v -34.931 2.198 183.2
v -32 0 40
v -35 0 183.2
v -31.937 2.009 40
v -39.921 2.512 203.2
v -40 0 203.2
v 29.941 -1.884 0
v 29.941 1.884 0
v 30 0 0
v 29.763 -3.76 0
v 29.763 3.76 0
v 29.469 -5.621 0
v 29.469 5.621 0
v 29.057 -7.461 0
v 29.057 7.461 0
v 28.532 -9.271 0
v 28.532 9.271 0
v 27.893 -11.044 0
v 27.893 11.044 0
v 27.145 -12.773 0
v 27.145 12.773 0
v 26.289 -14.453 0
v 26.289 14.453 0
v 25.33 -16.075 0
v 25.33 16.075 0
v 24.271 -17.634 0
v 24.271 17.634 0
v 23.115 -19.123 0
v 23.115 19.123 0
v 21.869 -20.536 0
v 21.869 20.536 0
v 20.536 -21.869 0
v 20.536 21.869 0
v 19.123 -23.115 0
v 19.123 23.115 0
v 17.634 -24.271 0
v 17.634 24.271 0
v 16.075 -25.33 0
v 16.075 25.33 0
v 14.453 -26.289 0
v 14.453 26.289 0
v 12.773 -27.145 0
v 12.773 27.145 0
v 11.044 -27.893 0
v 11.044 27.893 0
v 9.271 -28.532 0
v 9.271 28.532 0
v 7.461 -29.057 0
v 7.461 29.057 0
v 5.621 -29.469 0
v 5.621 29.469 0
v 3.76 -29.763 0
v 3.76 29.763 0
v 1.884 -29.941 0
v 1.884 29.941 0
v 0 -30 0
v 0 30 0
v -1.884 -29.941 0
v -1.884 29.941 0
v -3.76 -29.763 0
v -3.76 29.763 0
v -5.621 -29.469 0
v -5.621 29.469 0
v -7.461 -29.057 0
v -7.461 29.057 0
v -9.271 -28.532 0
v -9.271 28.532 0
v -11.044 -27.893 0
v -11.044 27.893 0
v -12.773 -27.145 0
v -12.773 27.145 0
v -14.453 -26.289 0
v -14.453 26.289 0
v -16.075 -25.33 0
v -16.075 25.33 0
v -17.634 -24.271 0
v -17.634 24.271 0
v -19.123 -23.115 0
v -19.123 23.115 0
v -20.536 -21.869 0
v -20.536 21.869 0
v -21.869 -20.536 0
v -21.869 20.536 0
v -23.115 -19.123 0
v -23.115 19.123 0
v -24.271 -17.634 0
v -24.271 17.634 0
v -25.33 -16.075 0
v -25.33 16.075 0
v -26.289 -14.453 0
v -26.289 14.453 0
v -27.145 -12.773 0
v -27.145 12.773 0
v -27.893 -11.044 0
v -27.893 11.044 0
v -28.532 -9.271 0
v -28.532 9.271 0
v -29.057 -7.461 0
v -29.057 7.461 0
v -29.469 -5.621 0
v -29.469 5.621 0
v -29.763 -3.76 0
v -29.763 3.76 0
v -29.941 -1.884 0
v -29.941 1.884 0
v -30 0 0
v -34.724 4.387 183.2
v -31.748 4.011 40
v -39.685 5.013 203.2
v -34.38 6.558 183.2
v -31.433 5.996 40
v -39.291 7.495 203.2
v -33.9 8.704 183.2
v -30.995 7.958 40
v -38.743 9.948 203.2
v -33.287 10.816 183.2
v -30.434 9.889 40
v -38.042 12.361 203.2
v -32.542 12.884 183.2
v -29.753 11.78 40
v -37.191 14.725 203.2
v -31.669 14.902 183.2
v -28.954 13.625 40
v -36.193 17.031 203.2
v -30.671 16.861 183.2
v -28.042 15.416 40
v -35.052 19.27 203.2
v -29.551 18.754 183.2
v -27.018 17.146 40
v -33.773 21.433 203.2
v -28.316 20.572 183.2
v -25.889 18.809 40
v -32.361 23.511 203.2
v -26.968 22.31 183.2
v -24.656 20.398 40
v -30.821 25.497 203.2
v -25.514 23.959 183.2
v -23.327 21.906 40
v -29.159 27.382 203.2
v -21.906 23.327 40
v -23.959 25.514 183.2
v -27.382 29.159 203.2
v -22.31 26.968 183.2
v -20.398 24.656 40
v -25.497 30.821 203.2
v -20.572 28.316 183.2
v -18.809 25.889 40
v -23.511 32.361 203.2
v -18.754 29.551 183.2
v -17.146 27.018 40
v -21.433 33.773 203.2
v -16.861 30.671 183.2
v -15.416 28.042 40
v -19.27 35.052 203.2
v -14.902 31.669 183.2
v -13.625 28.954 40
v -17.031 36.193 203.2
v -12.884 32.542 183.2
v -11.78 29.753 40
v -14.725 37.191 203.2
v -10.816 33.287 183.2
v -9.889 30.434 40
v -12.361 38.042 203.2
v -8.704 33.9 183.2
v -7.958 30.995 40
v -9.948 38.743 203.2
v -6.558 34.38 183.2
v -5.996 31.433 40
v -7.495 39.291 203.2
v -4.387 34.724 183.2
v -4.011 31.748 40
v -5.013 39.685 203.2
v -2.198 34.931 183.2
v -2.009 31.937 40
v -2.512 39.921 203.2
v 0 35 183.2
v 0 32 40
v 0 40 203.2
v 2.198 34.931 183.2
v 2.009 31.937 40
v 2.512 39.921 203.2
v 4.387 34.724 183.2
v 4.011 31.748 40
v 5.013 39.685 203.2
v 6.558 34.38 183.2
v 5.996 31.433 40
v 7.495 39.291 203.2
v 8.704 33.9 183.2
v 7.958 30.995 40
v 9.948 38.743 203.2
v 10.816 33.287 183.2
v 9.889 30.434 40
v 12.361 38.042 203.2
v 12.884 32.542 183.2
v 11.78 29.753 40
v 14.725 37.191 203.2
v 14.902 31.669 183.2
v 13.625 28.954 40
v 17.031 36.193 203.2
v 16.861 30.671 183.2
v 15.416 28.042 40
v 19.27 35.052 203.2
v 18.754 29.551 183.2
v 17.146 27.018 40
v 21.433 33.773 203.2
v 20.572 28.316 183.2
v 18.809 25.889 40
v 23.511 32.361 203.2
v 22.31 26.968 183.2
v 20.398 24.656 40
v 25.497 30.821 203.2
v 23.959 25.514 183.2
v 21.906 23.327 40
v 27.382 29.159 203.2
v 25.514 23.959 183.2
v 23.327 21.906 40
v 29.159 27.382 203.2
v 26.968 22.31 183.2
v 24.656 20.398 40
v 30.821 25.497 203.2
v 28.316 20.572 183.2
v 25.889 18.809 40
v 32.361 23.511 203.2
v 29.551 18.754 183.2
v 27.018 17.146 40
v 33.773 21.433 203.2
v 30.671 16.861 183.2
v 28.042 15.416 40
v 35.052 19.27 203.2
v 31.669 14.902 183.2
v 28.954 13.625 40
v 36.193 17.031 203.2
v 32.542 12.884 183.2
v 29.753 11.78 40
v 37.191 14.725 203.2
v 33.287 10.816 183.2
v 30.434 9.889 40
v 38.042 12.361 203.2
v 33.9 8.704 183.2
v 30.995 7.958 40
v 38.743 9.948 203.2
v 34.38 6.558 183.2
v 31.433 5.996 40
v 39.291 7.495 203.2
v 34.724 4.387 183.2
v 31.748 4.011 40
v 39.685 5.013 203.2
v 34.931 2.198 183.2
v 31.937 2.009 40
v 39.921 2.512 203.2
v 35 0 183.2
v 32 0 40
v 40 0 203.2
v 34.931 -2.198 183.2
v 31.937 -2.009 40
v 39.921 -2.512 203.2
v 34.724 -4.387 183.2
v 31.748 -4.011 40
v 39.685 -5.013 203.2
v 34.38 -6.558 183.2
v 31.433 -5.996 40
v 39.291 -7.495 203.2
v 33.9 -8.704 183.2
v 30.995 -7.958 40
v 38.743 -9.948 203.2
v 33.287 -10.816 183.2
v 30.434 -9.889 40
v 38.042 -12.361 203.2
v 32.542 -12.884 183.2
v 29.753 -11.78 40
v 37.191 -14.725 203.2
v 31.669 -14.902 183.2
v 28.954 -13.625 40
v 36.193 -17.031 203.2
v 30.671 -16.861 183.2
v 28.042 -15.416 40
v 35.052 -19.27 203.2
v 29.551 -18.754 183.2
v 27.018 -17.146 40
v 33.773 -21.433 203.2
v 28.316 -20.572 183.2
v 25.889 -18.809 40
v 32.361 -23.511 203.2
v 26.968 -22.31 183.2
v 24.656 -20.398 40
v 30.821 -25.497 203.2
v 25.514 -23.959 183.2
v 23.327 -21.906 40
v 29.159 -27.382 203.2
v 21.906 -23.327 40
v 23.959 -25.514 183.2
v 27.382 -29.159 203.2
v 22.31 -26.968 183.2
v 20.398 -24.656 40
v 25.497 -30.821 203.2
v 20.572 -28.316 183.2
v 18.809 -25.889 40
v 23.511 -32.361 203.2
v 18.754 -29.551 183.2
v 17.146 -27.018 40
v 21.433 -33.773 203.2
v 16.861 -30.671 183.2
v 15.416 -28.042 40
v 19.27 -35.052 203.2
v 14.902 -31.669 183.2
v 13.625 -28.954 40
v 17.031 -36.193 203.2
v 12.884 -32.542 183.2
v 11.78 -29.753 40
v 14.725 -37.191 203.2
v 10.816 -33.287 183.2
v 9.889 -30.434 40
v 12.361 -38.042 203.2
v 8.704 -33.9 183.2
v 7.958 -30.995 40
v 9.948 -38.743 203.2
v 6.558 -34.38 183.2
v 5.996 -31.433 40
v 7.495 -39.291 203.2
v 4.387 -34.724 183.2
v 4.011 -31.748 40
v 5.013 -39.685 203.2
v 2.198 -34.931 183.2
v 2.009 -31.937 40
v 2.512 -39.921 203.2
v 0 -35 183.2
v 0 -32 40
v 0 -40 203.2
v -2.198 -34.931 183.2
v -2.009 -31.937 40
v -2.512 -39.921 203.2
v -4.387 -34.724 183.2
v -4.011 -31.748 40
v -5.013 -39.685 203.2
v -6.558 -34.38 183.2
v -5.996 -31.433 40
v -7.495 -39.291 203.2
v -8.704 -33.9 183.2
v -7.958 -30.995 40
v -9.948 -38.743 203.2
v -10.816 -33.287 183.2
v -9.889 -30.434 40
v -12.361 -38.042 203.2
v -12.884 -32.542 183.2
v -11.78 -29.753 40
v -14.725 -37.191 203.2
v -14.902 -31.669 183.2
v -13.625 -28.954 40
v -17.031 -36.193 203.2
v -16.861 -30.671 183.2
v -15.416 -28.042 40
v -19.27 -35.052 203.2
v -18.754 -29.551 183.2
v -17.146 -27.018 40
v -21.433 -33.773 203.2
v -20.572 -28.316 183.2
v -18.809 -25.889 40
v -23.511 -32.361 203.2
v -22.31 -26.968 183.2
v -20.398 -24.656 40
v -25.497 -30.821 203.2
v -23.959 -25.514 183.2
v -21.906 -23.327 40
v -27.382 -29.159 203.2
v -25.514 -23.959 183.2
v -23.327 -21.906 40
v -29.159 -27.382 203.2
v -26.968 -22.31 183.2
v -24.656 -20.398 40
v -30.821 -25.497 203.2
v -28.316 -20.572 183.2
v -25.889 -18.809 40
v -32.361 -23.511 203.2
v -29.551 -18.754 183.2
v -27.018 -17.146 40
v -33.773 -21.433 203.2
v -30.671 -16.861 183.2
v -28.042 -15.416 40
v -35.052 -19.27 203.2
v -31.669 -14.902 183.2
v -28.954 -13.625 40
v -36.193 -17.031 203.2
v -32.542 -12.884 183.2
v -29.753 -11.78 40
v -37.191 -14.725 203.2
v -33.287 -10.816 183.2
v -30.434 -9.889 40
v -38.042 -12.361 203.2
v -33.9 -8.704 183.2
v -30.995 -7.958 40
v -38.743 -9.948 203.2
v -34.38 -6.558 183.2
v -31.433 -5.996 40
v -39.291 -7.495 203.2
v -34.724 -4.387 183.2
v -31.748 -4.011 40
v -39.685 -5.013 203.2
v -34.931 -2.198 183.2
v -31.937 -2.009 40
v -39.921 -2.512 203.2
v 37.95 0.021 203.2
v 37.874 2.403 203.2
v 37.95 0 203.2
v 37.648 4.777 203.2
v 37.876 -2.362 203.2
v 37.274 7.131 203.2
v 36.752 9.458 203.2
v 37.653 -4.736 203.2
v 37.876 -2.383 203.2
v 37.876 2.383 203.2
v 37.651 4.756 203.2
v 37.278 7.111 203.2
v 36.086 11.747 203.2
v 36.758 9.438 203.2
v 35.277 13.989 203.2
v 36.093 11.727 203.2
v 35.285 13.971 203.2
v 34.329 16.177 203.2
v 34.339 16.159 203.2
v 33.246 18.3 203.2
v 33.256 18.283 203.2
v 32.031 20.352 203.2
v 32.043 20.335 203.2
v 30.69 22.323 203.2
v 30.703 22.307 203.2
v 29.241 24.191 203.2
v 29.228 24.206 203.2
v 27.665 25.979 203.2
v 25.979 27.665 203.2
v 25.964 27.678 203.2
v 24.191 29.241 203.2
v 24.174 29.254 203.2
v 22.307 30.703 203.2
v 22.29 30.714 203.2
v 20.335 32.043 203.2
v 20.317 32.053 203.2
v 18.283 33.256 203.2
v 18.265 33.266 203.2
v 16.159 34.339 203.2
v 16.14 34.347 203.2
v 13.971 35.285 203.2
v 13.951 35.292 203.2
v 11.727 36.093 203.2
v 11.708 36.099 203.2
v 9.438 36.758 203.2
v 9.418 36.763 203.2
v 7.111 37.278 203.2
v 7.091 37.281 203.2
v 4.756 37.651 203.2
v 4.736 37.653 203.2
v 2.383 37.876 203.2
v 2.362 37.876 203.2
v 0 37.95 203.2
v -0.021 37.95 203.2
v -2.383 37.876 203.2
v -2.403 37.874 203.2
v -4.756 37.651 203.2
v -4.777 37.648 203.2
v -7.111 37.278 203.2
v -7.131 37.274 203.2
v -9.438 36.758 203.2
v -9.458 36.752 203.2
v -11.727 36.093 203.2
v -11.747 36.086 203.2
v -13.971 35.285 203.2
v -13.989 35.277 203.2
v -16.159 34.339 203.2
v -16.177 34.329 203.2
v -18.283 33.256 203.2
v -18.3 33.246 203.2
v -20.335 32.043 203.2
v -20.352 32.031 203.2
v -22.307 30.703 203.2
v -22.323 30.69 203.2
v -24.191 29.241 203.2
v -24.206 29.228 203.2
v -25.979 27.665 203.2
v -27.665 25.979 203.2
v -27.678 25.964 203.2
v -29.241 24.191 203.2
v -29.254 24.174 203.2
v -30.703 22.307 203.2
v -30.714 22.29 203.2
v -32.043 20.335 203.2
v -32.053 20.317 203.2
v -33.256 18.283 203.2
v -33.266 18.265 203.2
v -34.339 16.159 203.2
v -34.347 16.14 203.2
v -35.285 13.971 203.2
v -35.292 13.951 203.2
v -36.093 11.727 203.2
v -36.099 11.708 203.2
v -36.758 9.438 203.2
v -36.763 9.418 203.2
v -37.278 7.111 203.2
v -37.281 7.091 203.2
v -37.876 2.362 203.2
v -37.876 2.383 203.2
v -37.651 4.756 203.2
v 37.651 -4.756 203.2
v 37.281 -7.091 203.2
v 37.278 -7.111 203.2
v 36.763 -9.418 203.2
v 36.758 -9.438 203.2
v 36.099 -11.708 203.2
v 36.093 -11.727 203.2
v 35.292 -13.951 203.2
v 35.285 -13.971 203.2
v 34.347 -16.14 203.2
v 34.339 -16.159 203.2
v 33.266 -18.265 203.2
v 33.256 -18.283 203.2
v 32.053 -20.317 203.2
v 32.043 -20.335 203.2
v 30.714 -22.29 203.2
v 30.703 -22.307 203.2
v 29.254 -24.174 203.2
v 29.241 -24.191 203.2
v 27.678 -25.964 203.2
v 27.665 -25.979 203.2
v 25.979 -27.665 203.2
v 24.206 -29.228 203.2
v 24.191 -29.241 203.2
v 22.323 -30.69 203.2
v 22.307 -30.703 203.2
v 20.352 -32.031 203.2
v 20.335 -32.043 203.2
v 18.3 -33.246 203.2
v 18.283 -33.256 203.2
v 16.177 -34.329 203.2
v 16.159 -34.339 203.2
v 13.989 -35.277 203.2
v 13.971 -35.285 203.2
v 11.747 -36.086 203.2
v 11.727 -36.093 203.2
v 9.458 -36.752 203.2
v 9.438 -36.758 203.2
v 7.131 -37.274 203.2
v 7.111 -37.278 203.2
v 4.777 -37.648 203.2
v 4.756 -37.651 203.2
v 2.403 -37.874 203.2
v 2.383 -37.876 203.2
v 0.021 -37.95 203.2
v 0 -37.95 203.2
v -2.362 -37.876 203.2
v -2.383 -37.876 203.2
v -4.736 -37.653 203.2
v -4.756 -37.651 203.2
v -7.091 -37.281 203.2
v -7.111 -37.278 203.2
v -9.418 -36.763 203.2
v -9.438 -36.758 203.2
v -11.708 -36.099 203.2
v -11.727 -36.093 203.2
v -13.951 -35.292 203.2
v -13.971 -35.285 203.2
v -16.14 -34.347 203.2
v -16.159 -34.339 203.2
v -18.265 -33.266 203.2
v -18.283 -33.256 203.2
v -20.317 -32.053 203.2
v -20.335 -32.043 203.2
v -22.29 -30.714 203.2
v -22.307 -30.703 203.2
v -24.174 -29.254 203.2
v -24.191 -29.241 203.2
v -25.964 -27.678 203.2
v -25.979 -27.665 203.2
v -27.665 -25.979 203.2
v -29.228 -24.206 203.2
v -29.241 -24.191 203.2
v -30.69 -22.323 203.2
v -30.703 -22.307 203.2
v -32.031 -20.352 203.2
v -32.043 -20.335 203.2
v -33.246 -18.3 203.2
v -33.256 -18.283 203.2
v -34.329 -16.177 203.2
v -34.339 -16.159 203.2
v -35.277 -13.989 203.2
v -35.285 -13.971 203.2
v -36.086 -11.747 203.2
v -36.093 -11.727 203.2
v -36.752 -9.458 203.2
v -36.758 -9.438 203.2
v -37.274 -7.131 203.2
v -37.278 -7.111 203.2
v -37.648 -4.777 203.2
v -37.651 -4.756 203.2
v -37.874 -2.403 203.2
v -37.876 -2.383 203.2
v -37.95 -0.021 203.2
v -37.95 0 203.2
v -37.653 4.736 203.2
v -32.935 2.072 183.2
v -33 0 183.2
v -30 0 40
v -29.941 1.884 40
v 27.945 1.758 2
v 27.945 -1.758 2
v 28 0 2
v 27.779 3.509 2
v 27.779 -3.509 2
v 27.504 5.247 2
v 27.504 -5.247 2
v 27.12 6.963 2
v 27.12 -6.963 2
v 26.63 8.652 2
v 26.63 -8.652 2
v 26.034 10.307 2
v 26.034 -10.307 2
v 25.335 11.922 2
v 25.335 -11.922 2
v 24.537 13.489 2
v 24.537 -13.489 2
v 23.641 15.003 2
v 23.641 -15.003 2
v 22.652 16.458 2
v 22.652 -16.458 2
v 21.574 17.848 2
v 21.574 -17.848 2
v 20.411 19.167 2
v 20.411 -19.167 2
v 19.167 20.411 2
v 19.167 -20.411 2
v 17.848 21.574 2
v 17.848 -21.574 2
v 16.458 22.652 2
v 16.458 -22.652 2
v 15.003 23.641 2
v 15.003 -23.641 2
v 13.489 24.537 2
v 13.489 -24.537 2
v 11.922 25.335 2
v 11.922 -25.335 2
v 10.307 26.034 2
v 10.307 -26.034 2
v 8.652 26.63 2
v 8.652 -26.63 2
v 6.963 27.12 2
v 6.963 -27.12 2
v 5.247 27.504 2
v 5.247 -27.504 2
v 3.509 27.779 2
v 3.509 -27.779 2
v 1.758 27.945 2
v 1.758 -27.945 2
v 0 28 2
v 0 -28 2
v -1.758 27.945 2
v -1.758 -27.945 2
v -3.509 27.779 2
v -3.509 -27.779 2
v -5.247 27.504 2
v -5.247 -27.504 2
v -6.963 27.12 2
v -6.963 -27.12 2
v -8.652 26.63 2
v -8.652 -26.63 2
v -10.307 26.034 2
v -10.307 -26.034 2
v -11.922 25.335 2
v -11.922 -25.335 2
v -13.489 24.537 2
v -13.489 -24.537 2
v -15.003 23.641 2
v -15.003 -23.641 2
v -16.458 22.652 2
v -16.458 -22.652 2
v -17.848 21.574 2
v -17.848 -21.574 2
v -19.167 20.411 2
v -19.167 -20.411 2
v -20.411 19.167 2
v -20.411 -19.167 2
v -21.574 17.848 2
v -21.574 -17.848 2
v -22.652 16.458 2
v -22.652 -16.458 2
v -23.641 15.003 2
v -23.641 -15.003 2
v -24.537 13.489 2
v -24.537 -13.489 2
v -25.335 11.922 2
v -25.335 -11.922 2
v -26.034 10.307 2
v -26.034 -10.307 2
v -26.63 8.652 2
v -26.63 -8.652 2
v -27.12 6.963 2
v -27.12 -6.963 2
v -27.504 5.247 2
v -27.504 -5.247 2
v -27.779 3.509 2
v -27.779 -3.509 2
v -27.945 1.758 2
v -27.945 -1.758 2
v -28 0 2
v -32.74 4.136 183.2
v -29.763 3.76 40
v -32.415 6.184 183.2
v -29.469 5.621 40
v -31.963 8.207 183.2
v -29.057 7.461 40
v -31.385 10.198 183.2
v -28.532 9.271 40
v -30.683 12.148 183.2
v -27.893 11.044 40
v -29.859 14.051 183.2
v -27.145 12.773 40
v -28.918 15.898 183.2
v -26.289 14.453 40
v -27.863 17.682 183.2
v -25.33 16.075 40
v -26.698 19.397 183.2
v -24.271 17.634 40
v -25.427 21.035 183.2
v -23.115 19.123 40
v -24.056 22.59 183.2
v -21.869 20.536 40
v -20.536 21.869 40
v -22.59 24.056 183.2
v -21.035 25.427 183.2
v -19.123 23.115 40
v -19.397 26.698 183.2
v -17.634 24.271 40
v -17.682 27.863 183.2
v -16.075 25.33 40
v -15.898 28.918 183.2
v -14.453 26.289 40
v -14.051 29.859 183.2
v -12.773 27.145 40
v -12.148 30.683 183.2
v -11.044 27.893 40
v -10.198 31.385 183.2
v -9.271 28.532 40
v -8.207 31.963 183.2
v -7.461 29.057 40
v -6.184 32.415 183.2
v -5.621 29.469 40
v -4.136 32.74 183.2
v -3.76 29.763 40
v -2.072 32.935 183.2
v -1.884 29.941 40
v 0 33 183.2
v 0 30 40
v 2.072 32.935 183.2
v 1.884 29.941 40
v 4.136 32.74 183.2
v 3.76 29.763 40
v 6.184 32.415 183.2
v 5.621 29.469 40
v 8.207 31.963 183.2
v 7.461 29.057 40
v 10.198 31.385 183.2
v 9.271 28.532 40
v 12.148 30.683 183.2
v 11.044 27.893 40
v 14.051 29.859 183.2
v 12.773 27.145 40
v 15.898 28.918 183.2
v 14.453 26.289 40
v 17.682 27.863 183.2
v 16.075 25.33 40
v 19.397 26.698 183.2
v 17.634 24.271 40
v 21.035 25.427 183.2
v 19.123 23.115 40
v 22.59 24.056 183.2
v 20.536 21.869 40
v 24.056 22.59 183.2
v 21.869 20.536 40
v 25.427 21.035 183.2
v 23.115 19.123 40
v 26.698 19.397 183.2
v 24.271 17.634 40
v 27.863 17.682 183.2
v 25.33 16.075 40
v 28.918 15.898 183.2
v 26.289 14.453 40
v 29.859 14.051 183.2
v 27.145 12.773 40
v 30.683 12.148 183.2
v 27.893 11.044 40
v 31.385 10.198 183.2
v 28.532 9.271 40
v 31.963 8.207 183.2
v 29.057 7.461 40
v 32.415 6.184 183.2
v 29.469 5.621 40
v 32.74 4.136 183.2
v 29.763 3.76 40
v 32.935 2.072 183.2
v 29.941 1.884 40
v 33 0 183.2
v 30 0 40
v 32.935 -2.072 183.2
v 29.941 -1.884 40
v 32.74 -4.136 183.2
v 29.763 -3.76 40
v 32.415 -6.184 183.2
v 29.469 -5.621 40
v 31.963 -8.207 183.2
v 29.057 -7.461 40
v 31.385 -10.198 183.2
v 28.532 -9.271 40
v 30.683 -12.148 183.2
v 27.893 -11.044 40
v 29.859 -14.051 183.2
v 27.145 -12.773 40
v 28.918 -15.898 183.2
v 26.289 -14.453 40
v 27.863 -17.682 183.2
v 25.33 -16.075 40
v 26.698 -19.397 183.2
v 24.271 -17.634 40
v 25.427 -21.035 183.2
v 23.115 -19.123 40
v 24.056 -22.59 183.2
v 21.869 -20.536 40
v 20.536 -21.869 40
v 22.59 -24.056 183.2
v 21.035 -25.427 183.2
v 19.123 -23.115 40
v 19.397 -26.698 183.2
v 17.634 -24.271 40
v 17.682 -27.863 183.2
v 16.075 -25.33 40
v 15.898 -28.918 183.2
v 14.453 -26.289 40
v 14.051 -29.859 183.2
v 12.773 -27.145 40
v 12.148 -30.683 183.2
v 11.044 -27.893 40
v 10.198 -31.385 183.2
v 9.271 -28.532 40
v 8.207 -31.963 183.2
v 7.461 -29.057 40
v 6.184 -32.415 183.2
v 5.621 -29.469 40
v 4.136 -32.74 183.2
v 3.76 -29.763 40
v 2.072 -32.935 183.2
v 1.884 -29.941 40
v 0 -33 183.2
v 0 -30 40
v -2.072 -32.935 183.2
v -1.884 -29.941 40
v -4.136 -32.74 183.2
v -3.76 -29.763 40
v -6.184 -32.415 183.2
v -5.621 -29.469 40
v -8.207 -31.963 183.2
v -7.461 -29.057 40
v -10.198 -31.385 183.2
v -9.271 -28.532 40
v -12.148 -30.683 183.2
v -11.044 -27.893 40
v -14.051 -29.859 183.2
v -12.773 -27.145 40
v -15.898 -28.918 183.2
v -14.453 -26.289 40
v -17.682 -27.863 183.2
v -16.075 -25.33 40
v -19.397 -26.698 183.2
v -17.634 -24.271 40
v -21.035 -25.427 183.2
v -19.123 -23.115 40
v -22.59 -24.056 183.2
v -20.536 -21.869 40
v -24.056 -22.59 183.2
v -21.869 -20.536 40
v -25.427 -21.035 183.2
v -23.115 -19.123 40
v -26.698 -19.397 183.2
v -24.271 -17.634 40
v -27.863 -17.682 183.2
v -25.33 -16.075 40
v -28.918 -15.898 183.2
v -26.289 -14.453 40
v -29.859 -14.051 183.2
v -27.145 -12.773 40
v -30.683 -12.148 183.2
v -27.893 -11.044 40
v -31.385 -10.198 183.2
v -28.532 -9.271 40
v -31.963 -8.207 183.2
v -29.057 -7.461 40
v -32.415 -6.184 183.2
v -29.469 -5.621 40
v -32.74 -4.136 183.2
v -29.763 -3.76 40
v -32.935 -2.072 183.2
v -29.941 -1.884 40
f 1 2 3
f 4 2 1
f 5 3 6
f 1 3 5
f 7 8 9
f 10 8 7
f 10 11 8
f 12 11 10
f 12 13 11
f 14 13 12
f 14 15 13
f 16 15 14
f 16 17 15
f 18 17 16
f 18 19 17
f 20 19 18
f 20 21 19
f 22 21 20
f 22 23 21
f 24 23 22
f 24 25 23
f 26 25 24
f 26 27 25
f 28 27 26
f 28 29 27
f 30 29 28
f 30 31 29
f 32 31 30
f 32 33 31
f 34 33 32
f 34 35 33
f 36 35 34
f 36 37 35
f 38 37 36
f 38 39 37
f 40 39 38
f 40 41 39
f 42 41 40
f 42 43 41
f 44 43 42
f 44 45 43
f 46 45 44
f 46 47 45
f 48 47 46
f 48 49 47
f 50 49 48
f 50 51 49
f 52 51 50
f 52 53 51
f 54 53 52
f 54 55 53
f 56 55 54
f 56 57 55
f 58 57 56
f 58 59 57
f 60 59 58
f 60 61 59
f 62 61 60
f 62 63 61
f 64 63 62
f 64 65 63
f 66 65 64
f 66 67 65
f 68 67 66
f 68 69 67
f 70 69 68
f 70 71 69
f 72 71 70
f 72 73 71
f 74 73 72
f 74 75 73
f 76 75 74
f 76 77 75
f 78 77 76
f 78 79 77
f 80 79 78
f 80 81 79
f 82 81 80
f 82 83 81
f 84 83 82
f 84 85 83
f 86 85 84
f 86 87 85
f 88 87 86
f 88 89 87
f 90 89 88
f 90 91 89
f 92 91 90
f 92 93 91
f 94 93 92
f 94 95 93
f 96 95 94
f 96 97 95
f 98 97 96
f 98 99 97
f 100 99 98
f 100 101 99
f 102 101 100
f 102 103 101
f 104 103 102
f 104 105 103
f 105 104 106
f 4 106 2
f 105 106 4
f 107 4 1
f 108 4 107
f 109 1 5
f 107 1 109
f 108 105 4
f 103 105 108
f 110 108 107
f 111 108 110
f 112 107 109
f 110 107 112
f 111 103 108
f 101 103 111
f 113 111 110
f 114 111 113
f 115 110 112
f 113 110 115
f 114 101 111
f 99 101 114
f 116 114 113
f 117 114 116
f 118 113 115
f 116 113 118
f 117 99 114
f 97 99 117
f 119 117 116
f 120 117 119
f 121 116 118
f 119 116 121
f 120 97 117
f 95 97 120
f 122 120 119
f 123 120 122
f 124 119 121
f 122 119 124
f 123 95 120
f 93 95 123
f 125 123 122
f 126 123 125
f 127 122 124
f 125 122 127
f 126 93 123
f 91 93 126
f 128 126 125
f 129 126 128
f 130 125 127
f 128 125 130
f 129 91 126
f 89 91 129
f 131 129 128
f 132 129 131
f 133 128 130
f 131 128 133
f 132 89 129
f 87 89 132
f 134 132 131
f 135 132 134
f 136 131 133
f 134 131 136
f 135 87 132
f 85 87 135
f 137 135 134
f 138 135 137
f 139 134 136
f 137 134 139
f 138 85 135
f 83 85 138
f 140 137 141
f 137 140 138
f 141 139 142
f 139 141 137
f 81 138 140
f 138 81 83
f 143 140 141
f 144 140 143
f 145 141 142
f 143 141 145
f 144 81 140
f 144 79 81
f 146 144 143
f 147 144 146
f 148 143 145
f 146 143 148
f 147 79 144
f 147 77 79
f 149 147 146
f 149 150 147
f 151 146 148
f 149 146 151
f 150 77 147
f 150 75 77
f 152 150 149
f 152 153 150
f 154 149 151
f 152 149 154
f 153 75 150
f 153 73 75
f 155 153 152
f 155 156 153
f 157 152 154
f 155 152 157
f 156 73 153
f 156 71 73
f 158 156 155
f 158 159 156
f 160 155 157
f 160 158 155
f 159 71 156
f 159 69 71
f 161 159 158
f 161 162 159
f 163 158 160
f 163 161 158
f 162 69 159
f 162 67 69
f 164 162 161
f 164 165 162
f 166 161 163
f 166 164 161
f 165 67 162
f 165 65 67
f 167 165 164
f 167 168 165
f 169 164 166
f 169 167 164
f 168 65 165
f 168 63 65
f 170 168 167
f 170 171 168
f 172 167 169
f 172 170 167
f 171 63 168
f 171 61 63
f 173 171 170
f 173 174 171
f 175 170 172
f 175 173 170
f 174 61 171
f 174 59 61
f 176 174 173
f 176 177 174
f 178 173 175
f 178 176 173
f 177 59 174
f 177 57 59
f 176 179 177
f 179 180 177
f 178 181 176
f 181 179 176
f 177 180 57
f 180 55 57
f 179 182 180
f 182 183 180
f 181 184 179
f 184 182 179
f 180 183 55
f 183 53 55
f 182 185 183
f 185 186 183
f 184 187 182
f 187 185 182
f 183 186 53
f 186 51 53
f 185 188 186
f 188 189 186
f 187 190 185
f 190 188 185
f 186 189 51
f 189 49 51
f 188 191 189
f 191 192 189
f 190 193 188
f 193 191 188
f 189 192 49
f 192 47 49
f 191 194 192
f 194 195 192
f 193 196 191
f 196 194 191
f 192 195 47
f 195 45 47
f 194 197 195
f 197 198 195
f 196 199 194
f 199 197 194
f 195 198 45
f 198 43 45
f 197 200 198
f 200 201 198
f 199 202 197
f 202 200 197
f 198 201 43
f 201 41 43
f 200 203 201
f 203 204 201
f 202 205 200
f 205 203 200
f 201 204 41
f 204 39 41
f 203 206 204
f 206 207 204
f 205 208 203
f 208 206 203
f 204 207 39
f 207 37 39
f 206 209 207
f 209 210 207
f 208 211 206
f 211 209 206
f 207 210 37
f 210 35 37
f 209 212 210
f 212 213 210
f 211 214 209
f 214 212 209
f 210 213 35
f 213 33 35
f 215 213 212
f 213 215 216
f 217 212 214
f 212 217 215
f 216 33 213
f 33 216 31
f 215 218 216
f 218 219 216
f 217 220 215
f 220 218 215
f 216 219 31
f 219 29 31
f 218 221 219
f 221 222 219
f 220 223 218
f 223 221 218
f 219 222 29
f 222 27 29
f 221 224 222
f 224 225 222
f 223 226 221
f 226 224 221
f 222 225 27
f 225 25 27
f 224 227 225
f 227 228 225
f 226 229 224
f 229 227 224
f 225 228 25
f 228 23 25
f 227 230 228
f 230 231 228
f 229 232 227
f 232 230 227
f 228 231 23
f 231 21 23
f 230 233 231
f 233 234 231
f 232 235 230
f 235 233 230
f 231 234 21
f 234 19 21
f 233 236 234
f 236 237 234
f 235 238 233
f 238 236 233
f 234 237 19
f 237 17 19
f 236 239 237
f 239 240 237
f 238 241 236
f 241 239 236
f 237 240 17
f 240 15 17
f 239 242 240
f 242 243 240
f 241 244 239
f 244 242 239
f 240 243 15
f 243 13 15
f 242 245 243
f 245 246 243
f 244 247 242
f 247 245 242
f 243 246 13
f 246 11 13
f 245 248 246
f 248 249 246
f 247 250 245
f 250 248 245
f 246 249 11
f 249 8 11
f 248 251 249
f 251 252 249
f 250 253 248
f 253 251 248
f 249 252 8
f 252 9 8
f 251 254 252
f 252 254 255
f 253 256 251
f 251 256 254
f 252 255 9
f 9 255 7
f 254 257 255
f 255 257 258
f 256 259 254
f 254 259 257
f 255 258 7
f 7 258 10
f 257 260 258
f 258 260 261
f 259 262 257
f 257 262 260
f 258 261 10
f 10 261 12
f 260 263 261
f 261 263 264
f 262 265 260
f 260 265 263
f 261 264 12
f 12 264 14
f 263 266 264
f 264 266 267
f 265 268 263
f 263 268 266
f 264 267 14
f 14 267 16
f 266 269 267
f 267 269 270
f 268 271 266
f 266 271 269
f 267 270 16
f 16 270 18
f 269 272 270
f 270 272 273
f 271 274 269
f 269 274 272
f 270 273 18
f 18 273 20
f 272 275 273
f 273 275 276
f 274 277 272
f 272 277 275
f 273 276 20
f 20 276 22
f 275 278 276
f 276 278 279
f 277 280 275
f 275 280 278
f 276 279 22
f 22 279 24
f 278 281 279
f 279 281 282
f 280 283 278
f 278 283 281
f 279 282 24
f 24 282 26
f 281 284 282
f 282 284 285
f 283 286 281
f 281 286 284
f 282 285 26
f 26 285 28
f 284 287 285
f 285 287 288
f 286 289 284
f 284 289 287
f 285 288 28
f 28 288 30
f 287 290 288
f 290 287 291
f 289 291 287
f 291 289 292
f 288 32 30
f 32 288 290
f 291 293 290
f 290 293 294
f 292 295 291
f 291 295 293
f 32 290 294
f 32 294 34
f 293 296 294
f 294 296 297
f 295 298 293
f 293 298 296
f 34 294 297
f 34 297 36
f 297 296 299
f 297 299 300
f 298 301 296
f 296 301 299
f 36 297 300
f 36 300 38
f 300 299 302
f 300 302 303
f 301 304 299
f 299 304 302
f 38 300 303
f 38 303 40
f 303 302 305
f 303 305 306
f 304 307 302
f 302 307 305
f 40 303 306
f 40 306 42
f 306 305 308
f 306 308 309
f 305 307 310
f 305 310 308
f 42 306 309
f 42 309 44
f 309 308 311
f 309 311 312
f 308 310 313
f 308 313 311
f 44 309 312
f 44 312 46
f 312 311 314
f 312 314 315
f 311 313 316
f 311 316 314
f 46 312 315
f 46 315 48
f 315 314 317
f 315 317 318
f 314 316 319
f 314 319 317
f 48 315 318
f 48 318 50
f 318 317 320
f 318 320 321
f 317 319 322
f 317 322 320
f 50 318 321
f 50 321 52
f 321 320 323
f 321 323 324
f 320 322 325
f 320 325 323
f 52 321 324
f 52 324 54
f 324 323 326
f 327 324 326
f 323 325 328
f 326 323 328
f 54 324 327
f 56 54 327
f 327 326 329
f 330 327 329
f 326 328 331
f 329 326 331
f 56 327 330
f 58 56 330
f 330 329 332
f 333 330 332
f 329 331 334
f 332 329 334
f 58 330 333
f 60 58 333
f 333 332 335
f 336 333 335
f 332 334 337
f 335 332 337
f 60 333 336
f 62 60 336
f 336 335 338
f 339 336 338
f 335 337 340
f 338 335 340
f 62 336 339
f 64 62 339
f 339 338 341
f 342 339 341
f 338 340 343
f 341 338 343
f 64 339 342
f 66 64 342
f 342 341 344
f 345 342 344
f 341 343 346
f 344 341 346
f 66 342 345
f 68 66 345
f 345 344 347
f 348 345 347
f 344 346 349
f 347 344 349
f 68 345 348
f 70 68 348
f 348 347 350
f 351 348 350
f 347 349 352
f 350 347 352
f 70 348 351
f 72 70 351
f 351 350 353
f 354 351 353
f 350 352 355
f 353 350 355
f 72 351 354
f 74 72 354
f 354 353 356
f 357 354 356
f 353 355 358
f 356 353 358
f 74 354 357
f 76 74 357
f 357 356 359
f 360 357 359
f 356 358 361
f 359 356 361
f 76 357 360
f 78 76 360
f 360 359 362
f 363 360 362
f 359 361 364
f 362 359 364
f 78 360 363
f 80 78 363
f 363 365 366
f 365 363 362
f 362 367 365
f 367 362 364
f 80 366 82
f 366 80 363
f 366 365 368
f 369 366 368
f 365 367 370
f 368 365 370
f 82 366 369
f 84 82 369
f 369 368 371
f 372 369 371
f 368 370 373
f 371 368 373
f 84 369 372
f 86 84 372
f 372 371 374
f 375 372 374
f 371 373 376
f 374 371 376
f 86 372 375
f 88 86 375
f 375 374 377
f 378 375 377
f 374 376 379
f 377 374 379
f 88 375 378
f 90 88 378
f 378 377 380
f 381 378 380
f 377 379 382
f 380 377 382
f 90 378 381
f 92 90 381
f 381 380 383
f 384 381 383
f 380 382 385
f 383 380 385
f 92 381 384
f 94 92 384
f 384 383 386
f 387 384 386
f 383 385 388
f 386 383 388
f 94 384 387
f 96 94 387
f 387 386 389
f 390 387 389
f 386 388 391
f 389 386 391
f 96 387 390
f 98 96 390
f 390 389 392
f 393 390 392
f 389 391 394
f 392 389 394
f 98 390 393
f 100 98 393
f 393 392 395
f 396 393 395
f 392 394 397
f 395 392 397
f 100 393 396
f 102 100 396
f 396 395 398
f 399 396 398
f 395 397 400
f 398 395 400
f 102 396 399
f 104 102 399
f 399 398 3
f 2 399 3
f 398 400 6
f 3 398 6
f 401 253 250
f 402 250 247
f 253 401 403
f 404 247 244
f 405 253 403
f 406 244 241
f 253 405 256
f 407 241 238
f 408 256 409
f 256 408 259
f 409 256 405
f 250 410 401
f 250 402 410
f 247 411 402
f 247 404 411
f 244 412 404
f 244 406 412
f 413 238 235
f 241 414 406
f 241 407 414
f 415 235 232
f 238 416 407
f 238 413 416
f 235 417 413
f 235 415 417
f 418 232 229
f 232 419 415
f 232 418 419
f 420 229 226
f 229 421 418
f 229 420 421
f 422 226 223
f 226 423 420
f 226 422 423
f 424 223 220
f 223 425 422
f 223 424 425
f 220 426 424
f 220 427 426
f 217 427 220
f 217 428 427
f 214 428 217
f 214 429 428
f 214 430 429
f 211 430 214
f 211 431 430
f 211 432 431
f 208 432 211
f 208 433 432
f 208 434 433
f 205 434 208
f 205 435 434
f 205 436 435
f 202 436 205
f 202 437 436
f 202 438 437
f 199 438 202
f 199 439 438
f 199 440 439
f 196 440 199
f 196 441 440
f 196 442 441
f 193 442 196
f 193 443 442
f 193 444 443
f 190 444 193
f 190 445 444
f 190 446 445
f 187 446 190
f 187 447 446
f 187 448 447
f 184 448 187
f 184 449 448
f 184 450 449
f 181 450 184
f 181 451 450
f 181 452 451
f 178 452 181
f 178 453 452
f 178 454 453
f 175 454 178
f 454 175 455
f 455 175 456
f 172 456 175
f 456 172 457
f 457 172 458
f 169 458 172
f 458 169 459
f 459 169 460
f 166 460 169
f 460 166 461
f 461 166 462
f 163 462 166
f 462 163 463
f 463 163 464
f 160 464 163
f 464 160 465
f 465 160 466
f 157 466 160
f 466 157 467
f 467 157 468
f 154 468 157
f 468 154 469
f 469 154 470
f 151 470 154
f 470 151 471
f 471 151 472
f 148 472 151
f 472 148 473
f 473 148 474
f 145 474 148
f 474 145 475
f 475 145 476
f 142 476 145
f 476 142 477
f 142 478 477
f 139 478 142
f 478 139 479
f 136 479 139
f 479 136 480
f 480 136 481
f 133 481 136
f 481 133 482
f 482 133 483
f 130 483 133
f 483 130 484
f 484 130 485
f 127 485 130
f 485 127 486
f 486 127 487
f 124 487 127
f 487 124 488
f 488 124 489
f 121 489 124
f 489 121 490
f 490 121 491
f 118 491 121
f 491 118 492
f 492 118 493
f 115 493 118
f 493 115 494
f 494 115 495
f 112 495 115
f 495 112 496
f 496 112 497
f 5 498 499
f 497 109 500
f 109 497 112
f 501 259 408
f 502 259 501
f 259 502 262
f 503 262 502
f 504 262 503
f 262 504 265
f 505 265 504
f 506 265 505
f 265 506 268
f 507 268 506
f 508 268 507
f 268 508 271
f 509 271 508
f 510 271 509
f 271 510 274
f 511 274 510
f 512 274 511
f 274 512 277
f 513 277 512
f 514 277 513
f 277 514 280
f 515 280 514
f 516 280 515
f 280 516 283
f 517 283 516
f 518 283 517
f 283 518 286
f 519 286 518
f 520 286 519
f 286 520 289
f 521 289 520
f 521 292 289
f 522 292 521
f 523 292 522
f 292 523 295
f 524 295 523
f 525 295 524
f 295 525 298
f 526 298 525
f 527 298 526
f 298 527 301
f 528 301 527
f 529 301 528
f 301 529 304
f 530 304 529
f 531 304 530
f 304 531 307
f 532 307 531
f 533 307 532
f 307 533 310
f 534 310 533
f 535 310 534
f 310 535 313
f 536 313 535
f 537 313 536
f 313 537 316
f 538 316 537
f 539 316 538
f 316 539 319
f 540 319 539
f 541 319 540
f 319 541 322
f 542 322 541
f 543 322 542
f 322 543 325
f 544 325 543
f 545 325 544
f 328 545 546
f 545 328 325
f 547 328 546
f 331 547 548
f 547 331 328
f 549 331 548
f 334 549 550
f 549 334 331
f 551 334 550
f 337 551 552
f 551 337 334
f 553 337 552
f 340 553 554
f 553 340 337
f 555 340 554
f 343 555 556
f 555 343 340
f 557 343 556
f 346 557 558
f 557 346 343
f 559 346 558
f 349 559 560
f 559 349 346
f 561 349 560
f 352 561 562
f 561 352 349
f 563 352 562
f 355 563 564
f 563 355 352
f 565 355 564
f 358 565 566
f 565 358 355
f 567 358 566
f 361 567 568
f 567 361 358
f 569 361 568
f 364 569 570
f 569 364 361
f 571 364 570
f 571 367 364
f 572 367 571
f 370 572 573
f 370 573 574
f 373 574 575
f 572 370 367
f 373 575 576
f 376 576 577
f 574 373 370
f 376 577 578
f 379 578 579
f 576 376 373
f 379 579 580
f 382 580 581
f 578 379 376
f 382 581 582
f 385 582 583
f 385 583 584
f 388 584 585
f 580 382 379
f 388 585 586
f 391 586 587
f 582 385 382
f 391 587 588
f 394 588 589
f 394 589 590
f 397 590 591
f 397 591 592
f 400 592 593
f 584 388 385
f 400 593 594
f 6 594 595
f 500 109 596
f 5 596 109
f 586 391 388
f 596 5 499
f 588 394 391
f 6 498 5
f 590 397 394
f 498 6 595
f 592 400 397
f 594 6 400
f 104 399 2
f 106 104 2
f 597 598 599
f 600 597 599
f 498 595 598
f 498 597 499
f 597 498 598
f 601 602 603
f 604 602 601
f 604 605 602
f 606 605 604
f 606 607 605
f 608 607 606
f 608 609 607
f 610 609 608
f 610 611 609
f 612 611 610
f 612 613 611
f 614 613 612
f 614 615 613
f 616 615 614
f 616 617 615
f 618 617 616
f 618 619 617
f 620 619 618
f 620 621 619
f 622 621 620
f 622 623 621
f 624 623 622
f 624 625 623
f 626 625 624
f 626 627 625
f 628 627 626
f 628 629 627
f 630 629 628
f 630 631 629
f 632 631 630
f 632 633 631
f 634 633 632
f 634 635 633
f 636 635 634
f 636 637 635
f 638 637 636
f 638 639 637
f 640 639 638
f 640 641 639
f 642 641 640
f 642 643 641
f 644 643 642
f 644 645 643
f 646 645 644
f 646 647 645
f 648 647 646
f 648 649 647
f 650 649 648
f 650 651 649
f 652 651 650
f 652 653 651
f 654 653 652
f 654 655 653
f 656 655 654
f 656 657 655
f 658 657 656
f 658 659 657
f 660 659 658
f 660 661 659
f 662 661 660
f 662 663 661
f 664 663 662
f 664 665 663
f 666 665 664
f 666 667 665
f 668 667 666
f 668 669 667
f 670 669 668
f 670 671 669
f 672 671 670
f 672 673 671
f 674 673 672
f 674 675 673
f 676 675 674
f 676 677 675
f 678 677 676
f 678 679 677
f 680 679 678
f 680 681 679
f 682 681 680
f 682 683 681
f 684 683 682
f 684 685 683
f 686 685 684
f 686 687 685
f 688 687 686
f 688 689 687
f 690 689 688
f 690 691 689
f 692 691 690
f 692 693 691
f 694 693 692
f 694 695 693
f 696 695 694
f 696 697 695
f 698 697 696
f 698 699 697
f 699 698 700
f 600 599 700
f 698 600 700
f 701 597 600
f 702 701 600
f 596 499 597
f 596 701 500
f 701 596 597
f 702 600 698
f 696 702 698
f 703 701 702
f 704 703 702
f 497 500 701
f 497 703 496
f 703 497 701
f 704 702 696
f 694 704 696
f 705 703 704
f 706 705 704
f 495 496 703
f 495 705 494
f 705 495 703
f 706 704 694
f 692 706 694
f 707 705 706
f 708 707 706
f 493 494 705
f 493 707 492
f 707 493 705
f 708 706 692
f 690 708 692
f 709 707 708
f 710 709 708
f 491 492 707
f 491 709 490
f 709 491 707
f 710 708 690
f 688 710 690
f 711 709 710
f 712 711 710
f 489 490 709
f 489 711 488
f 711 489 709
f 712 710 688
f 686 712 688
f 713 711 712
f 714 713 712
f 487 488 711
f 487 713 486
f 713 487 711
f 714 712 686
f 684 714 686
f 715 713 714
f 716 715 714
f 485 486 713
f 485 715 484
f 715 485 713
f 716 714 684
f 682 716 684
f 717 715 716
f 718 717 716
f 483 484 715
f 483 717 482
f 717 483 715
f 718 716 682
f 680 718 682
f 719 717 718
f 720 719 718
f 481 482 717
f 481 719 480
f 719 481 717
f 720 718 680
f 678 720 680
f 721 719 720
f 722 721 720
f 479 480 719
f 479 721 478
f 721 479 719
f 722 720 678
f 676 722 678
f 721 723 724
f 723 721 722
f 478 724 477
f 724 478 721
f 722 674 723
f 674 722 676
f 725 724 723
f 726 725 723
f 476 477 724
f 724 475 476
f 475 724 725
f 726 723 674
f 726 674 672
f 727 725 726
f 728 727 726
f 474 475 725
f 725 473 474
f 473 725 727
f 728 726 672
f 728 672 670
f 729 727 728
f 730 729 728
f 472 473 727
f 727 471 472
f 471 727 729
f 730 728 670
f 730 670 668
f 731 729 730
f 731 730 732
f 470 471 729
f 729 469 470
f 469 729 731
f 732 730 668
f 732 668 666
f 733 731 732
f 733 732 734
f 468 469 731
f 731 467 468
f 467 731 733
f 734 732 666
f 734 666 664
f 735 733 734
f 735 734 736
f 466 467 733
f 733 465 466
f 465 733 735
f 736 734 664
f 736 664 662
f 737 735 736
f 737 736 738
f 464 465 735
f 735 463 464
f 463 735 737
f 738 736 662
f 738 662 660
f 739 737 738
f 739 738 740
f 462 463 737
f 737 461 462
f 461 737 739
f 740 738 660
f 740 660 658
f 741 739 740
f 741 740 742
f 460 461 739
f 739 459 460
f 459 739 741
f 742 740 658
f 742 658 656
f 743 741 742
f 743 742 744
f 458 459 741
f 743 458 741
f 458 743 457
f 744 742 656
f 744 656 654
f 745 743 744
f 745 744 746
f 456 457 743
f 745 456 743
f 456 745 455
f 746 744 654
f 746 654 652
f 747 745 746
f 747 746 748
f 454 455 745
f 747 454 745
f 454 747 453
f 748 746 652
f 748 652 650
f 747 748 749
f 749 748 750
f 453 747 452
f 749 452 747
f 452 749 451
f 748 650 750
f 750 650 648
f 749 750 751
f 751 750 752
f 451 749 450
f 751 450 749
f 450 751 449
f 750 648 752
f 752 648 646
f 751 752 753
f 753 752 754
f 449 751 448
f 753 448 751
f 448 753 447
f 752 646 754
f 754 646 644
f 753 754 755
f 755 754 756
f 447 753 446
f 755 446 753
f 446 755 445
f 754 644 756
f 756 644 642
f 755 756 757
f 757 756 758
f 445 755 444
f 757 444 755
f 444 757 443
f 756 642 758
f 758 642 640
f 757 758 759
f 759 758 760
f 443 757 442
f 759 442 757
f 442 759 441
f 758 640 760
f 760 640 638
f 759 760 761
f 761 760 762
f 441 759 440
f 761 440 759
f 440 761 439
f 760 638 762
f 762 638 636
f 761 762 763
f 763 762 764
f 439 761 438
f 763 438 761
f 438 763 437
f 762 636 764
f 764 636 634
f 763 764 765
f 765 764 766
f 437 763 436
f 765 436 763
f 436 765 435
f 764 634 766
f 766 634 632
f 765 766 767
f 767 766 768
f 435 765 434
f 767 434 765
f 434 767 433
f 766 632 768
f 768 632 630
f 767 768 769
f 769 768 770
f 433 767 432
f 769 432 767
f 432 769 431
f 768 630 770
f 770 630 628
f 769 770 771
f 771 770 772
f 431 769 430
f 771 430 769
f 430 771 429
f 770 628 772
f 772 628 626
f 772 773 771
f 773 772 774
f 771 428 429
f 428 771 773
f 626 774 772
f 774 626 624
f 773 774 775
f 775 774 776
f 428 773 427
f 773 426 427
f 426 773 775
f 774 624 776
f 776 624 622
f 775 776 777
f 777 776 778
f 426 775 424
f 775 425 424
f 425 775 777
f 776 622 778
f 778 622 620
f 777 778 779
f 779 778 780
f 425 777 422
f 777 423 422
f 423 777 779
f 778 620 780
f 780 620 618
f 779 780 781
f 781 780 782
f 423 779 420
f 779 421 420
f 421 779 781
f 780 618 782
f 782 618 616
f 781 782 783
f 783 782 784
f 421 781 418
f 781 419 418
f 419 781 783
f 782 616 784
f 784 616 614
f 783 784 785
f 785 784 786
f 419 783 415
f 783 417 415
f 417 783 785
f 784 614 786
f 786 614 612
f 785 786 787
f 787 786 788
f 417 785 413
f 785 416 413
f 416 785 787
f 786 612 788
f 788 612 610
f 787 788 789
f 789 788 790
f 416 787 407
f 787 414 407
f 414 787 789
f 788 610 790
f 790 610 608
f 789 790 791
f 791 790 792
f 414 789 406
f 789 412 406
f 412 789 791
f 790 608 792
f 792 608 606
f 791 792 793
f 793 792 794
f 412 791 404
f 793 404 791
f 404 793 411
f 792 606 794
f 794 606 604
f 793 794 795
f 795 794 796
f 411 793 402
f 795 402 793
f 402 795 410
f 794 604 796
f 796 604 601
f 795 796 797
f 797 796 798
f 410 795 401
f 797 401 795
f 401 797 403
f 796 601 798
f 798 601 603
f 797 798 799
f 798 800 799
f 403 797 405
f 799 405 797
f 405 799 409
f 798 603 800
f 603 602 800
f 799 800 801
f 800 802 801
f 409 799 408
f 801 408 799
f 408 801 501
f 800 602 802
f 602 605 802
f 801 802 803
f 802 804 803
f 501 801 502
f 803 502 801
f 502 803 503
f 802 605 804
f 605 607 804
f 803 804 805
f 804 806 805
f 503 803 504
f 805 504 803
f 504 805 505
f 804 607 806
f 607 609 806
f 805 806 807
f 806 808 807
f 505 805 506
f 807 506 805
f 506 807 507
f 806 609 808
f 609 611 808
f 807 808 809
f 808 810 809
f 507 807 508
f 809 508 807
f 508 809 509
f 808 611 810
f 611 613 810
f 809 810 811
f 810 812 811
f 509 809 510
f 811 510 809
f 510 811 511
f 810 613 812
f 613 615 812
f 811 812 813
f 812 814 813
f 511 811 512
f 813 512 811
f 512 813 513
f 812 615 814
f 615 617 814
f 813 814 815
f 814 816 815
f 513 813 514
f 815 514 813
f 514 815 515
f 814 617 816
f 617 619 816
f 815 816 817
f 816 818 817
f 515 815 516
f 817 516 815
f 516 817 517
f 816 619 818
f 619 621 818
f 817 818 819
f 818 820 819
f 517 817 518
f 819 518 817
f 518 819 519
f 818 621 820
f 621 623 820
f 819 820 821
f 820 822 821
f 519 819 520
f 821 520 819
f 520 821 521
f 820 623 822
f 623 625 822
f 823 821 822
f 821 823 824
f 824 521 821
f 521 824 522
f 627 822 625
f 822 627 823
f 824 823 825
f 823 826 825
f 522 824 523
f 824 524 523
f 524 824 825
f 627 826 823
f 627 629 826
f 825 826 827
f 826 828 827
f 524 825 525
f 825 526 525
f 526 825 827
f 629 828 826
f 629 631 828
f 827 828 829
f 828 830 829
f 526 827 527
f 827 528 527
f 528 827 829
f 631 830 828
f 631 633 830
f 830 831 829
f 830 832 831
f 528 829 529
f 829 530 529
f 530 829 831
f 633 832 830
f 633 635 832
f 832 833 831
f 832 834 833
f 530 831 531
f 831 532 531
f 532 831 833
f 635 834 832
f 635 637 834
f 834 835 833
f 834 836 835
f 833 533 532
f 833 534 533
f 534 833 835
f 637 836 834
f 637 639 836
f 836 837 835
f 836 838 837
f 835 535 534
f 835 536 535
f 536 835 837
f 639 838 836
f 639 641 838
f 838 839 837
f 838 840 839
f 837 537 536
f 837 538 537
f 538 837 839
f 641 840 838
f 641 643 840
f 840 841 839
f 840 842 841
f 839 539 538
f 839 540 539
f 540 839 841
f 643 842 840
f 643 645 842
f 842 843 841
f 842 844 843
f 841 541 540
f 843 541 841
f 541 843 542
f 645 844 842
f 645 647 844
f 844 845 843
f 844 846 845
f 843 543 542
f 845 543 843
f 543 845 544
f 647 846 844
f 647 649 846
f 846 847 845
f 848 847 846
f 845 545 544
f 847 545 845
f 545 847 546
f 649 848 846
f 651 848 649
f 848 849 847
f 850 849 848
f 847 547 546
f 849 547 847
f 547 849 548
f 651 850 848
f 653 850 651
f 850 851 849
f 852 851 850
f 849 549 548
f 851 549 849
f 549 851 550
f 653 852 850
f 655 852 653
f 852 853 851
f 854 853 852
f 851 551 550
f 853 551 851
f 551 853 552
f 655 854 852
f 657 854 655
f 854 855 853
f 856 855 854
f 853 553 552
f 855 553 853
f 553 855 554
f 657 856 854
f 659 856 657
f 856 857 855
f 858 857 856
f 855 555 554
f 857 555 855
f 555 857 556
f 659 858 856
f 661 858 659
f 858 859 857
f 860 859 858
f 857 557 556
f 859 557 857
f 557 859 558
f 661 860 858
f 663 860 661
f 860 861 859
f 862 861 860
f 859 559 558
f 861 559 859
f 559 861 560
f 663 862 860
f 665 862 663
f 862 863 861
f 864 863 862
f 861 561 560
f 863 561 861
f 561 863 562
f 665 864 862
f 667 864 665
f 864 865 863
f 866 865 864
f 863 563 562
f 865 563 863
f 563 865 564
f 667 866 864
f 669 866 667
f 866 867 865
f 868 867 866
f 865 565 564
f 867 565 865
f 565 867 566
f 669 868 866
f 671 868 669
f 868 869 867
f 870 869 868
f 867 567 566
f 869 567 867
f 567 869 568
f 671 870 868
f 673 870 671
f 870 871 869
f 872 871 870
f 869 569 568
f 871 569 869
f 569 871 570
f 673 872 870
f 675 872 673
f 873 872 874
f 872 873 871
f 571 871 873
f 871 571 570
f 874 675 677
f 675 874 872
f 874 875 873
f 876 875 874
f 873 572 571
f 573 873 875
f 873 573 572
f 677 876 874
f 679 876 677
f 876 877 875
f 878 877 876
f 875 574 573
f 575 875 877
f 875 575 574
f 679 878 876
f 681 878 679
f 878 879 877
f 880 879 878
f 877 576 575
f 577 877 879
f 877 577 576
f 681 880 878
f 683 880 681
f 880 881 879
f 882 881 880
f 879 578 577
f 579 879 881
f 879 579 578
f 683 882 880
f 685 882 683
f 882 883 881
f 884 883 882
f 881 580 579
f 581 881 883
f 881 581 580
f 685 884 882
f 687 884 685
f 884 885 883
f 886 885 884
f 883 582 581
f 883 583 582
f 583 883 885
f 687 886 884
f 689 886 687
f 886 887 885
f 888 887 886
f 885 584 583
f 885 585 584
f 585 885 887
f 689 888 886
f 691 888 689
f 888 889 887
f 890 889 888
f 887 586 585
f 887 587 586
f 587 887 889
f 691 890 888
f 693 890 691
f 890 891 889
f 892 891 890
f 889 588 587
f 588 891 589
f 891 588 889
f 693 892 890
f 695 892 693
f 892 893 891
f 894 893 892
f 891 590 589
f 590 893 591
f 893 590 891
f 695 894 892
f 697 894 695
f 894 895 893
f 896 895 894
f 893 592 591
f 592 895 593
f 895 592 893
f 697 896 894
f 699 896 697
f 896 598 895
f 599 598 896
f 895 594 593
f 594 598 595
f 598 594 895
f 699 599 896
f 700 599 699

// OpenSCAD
$fn = 100; // Curve resolution

// Dimensions
glass_height = 203.2;      // 8 inches
wall_thickness = 2;        // mm
rim_clearance = 0.2;       // upward offset to avoid rim artifacts

// Outer profile (blue)
outer_profile = [
    [0, 0],
    [30, 0],
    [32, 40],
    [35, glass_height - 20],
    [40, glass_height],
    [0, glass_height]
];

// Inner profile (red, offset inward & raised at top; base starts at wall_thickness height)
inner_profile = [
    [0, glass_height + rim_clearance],
    [40 - wall_thickness, glass_height + rim_clearance],
    [35 - wall_thickness, glass_height - 20],
    [32 - wall_thickness, 40],
    [30 - wall_thickness, wall_thickness],
    [0, wall_thickness]
];

// Final model with colored difference
difference() {
    // Outer shell
    color("blue")
    rotate_extrude()
        polygon(points=outer_profile);

    // Inner cavity
    color("red")
    rotate_extrude()
        polygon(points=inner_profile);
}
